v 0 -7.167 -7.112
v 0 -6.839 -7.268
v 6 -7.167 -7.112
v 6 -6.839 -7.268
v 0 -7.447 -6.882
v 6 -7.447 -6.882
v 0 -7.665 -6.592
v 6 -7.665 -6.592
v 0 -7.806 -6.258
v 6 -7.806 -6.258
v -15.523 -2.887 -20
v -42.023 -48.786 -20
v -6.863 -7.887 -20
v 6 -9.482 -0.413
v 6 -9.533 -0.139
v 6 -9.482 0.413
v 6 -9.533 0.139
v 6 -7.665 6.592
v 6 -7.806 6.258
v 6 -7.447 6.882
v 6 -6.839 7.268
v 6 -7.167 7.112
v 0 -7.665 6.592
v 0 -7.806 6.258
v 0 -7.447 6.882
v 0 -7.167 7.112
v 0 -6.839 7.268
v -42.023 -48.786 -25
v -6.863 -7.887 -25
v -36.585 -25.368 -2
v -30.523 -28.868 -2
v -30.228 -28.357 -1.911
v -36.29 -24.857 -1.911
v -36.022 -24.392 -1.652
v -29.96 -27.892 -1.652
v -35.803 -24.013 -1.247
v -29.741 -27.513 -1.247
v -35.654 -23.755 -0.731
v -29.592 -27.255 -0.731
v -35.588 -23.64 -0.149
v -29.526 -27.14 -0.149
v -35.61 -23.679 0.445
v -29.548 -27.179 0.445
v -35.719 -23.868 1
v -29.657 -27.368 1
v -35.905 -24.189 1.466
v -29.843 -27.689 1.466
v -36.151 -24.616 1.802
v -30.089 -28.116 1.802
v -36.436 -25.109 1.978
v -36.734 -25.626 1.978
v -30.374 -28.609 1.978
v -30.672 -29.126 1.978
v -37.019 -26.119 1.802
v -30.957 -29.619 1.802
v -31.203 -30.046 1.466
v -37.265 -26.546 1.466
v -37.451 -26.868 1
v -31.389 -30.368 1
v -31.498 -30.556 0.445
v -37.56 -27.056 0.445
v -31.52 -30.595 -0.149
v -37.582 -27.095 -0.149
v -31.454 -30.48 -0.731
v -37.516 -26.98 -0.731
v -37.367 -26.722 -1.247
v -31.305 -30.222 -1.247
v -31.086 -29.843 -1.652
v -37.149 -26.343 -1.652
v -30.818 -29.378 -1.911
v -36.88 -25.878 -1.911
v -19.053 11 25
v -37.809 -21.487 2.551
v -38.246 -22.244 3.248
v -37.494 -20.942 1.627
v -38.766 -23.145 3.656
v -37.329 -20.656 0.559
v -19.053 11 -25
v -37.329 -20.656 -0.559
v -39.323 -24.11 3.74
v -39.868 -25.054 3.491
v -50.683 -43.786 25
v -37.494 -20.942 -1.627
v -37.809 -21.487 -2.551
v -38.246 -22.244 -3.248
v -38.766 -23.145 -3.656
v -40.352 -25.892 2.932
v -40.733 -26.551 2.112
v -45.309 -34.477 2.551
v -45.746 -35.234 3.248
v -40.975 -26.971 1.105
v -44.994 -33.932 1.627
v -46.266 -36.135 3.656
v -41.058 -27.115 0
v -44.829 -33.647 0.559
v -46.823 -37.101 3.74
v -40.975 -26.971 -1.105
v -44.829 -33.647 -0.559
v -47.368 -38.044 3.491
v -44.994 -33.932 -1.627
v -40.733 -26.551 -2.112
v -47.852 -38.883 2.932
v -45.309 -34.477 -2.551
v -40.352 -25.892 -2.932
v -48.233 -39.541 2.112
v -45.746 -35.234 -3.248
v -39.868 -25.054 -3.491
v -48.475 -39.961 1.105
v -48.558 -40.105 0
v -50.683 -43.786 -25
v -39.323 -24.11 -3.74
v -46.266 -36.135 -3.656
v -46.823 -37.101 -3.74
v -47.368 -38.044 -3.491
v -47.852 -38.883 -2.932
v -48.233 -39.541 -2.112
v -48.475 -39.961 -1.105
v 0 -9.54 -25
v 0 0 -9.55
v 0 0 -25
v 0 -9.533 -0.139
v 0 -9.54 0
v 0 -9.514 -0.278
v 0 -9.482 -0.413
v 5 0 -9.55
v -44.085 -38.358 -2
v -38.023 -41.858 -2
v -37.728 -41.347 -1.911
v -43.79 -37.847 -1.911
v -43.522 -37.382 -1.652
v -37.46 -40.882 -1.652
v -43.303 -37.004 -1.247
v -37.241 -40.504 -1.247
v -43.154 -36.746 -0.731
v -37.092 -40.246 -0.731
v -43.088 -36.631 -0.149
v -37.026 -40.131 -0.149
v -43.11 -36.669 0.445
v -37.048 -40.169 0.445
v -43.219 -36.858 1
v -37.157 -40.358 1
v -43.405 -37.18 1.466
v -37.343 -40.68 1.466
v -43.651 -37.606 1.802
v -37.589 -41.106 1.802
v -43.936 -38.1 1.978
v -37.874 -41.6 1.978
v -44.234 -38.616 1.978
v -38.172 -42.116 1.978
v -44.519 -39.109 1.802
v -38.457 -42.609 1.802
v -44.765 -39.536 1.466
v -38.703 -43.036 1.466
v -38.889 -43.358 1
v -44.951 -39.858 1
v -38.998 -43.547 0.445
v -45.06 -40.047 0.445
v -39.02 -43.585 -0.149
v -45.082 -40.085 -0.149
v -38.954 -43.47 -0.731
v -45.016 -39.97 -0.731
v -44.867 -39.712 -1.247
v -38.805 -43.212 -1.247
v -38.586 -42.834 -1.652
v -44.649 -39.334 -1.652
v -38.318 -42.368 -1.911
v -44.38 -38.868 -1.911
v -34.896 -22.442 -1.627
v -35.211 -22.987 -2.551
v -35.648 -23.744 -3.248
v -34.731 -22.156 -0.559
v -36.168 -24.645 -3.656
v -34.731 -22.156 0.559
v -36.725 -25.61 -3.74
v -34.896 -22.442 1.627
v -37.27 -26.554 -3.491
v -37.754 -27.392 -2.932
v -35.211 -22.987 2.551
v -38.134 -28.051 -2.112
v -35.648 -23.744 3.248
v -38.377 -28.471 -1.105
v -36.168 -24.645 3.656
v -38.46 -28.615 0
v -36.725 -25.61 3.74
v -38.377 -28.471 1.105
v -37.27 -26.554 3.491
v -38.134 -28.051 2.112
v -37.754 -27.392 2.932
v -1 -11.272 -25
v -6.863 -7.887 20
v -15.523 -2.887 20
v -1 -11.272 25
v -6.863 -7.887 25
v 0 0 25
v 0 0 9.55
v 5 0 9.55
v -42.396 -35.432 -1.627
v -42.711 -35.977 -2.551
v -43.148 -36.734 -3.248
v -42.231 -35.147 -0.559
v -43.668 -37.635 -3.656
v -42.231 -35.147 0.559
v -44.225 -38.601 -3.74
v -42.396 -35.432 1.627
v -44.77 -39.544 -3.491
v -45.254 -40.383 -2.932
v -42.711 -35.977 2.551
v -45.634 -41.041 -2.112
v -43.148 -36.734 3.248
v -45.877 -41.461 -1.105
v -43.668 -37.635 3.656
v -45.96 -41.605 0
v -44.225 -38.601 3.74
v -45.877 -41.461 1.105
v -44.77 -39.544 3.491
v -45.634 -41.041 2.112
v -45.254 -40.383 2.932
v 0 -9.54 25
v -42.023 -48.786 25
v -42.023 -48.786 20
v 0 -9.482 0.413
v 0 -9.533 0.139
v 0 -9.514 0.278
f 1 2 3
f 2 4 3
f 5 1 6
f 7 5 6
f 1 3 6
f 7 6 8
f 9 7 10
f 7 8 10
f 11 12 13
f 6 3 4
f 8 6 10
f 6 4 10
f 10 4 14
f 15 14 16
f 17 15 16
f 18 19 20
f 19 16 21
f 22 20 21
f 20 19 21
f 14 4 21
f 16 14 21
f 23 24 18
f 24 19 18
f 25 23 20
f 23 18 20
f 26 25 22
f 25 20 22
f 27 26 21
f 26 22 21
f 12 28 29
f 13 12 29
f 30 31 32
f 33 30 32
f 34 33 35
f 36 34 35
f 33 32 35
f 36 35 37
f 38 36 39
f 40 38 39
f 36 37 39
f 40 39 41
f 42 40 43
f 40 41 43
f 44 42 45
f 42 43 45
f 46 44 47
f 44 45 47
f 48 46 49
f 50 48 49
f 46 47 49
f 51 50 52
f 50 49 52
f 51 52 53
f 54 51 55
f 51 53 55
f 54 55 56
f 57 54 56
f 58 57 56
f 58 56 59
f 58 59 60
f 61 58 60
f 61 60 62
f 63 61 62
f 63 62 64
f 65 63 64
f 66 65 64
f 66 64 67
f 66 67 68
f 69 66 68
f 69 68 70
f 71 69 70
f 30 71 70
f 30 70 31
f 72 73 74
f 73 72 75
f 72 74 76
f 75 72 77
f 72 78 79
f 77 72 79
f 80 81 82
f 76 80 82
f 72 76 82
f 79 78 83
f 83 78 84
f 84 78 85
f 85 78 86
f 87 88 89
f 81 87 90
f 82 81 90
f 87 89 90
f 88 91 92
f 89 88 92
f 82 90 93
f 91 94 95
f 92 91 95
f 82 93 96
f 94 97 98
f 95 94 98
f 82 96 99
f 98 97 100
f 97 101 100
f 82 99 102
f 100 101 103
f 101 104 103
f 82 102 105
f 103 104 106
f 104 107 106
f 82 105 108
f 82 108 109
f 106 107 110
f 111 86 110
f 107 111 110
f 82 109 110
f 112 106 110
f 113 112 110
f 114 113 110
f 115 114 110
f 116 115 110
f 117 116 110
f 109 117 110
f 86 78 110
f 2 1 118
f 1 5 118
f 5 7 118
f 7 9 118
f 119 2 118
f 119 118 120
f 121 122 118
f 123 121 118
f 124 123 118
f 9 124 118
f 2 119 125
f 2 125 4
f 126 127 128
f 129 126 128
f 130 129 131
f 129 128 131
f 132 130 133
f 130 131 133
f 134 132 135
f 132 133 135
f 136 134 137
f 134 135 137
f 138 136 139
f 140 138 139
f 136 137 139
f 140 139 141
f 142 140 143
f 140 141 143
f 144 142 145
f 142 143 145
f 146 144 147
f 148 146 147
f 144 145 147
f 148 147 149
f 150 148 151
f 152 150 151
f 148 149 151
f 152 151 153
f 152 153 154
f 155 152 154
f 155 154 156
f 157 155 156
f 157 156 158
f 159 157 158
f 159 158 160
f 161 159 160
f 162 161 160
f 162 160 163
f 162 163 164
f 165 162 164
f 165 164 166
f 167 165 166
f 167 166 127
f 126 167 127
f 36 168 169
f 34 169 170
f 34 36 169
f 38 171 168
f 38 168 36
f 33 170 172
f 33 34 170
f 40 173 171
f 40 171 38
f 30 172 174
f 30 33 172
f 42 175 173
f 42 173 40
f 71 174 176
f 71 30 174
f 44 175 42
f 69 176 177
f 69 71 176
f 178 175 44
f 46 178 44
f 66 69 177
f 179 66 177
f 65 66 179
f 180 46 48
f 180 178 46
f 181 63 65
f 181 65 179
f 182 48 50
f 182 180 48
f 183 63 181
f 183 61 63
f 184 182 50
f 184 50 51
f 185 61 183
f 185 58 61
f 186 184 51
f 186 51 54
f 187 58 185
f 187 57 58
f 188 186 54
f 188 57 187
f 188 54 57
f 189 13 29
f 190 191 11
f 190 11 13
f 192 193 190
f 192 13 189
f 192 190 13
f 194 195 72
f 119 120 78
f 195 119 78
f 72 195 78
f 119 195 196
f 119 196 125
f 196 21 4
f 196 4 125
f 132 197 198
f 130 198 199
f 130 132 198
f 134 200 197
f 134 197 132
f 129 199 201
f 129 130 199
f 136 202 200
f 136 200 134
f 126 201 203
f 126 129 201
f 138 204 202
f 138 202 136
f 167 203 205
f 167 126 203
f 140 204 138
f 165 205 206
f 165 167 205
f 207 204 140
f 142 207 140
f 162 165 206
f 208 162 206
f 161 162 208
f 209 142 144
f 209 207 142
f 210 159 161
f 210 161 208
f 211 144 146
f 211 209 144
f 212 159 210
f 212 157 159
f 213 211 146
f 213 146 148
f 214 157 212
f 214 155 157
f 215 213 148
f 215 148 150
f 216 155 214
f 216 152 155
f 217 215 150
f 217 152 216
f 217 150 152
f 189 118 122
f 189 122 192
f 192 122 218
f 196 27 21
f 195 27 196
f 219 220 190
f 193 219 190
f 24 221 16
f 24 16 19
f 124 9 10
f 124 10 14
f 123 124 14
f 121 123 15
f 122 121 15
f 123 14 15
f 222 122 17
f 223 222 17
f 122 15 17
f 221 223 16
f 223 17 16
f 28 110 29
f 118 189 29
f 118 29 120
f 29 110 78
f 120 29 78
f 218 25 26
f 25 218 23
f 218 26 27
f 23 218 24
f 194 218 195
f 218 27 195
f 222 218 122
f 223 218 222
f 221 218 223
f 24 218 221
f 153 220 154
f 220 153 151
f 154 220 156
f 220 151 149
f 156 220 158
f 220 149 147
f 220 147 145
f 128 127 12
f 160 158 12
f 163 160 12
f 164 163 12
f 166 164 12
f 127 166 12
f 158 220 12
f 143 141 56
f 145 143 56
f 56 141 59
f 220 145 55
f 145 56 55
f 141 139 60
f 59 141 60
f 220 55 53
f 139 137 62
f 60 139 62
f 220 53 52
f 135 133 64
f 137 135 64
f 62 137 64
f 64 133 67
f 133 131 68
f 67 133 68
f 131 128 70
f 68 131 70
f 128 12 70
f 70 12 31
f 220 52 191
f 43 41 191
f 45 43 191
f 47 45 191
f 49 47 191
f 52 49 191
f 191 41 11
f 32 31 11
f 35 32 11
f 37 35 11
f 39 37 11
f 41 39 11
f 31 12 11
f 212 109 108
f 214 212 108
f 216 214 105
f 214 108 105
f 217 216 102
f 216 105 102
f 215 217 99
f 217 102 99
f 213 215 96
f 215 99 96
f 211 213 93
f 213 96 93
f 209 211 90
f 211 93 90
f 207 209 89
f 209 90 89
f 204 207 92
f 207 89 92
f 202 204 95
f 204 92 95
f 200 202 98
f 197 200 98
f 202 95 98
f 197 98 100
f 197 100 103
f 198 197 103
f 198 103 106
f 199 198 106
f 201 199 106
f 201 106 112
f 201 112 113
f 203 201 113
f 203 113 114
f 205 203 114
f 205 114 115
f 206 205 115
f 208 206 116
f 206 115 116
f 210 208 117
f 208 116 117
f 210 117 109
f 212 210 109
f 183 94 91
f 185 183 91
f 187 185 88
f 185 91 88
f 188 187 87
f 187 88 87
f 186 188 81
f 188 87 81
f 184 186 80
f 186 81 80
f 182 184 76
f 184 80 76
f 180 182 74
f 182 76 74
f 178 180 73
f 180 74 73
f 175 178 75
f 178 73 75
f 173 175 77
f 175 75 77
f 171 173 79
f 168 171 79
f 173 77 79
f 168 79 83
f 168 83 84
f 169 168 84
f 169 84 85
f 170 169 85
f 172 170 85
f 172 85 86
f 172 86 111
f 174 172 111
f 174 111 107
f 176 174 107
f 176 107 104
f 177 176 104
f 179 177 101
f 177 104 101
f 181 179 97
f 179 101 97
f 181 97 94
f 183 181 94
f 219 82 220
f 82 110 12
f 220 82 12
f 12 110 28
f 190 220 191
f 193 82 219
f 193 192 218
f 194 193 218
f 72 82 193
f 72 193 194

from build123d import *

# Parameters (mm, degrees)
BOSS_EXTRUDE1_DEPTH      = 6
FILLET1_R                = 1.5
BOSS_EXTRUDE2_DEPTH      = 25
BOSS_EXTRUDE2_DEPTH_BACK = 25
CUT_EXTRUDE1_DEPTH       = 87.306907839
BOSS_EXTRUDE3_DEPTH      = 2
F_4_0_4_DIAMETER_HOLE1_D = 4
SKETCH15_R               = 3.75
CUT_EXTRUDE2_DEPTH       = 3
SKETCH16_W               = 5
SKETCH16_H               = 53
BOSS_EXTRUDE4_DEPTH      = 10
CUT_EXTRUDE3_DEPTH       = 87.525968801
CUT_EXTRUDE3_DEPTH_BACK  = 10


with BuildPart() as part:
    # Sketch1 → Boss-Extrude1 (new body)
    with BuildSketch(Plane(origin=(0, 0, 0), x_dir=(0, 0, -1), z_dir=(1, 0, 0))):
        Polygon((-9.55, 0), (9.55, 0), (7.017409876, -7.588543158), (0, -9.6), (-7.017409876, -7.588543158), align=None)
    extrude(amount=BOSS_EXTRUDE1_DEPTH)

    # Fillet1
    fillet1_edges = [part.edges().sort_by_distance(p)[0] for p in [
        (3, -7.588543158, -7.017409876),
        (3, -9.6, 0),
        (3, -7.588543158, 7.017409876),
    ]]
    fillet(fillet1_edges, radius=FILLET1_R)

    # Sketch2 → Boss-Extrude2 (add, two sides: drawn at the far end of the back side and taken through both)
    with BuildSketch(Plane.XY.offset(-BOSS_EXTRUDE2_DEPTH_BACK)):
        Polygon((0, 0), (-19.052558883, 11), (-50.683324779, -43.786093614), (-42.023070741, -48.786093614), (-14.523070741, -1.154696406), (0, -9.539595208), align=None)
    extrude(amount=BOSS_EXTRUDE2_DEPTH + BOSS_EXTRUDE2_DEPTH_BACK)

    # Sketch10 → Cut-Extrude1 (cut, through all)
    with BuildSketch(Plane.XY.offset(25)):
        Polygon((6, 0), (6, -6.839154339), (5, 0), align=None)
    extrude(amount=-CUT_EXTRUDE1_DEPTH, mode=Mode.SUBTRACT)

    # Sketch14 → Boss-Extrude3 (add)
    with BuildSketch(Plane(origin=(-4.130765896, -7.154696406, 0), x_dir=(0.8660254037844397, -0.4999999999999982, 0), z_dir=(-0.4999999999999983, -0.8660254037844398, 0))):
        Polygon((-12, 25), (-12, -25), (4.769797604, -25), (4.769797604, 0), (4.769797604, 25), align=None)
    extrude(amount=BOSS_EXTRUDE3_DEPTH)

    # Ø4.0 (4) Diameter Hole1 (through all)
    with Locations(Plane(origin=(-19.052558883, 11, 0), x_dir=(0, 0, 1), z_dir=(-0.8660254037844399, 0.4999999999999977, 0))):
        with Locations((0, -40.261531792), (0, -55.261531792)):
            Hole(F_4_0_4_DIAMETER_HOLE1_D / 2)

    # Sketch15 → Cut-Extrude2 (cut)
    with BuildSketch(Plane(origin=(-19.052558883, 11, 0), x_dir=(-0.4999999999999977, -0.8660254037844399, 0), z_dir=(-0.8660254037844399, 0.4999999999999977, 0))):
        with Locations((40.261531792, 0)):
            Circle(SKETCH15_R)
        with Locations((55.261531792, 0)):
            Circle(SKETCH15_R)
    extrude(amount=-CUT_EXTRUDE2_DEPTH, mode=Mode.SUBTRACT)

    # Sketch16 → Boss-Extrude4 (add)
    with BuildSketch(Plane(origin=(-10.392304845, 6, 0), x_dir=(0, 0, -1), z_dir=(0.8660254037844398, -0.49999999999999795, 0))):
        with Locations((-22.5, -36.761531792)):
            Rectangle(SKETCH16_W, SKETCH16_H)
    boss_extrude4 = extrude(amount=BOSS_EXTRUDE4_DEPTH)

    # Mirror1: Boss-Extrude4 across plane
    add(boss_extrude4.mirror(Plane.XY))

    # Sketch17 → Cut-Extrude3 (cut, two sides: drawn at the far end of the back side and taken through both)
    with BuildSketch(Plane.XY.offset(-20).offset(-CUT_EXTRUDE3_DEPTH_BACK)):
        Polygon((-42.023070741, -48.786093614), (-6.862816703, -7.886747213), (-33.362816703, -53.786093614), align=None)
    extrude(amount=CUT_EXTRUDE3_DEPTH + CUT_EXTRUDE3_DEPTH_BACK, mode=Mode.SUBTRACT)


solid = part.part
